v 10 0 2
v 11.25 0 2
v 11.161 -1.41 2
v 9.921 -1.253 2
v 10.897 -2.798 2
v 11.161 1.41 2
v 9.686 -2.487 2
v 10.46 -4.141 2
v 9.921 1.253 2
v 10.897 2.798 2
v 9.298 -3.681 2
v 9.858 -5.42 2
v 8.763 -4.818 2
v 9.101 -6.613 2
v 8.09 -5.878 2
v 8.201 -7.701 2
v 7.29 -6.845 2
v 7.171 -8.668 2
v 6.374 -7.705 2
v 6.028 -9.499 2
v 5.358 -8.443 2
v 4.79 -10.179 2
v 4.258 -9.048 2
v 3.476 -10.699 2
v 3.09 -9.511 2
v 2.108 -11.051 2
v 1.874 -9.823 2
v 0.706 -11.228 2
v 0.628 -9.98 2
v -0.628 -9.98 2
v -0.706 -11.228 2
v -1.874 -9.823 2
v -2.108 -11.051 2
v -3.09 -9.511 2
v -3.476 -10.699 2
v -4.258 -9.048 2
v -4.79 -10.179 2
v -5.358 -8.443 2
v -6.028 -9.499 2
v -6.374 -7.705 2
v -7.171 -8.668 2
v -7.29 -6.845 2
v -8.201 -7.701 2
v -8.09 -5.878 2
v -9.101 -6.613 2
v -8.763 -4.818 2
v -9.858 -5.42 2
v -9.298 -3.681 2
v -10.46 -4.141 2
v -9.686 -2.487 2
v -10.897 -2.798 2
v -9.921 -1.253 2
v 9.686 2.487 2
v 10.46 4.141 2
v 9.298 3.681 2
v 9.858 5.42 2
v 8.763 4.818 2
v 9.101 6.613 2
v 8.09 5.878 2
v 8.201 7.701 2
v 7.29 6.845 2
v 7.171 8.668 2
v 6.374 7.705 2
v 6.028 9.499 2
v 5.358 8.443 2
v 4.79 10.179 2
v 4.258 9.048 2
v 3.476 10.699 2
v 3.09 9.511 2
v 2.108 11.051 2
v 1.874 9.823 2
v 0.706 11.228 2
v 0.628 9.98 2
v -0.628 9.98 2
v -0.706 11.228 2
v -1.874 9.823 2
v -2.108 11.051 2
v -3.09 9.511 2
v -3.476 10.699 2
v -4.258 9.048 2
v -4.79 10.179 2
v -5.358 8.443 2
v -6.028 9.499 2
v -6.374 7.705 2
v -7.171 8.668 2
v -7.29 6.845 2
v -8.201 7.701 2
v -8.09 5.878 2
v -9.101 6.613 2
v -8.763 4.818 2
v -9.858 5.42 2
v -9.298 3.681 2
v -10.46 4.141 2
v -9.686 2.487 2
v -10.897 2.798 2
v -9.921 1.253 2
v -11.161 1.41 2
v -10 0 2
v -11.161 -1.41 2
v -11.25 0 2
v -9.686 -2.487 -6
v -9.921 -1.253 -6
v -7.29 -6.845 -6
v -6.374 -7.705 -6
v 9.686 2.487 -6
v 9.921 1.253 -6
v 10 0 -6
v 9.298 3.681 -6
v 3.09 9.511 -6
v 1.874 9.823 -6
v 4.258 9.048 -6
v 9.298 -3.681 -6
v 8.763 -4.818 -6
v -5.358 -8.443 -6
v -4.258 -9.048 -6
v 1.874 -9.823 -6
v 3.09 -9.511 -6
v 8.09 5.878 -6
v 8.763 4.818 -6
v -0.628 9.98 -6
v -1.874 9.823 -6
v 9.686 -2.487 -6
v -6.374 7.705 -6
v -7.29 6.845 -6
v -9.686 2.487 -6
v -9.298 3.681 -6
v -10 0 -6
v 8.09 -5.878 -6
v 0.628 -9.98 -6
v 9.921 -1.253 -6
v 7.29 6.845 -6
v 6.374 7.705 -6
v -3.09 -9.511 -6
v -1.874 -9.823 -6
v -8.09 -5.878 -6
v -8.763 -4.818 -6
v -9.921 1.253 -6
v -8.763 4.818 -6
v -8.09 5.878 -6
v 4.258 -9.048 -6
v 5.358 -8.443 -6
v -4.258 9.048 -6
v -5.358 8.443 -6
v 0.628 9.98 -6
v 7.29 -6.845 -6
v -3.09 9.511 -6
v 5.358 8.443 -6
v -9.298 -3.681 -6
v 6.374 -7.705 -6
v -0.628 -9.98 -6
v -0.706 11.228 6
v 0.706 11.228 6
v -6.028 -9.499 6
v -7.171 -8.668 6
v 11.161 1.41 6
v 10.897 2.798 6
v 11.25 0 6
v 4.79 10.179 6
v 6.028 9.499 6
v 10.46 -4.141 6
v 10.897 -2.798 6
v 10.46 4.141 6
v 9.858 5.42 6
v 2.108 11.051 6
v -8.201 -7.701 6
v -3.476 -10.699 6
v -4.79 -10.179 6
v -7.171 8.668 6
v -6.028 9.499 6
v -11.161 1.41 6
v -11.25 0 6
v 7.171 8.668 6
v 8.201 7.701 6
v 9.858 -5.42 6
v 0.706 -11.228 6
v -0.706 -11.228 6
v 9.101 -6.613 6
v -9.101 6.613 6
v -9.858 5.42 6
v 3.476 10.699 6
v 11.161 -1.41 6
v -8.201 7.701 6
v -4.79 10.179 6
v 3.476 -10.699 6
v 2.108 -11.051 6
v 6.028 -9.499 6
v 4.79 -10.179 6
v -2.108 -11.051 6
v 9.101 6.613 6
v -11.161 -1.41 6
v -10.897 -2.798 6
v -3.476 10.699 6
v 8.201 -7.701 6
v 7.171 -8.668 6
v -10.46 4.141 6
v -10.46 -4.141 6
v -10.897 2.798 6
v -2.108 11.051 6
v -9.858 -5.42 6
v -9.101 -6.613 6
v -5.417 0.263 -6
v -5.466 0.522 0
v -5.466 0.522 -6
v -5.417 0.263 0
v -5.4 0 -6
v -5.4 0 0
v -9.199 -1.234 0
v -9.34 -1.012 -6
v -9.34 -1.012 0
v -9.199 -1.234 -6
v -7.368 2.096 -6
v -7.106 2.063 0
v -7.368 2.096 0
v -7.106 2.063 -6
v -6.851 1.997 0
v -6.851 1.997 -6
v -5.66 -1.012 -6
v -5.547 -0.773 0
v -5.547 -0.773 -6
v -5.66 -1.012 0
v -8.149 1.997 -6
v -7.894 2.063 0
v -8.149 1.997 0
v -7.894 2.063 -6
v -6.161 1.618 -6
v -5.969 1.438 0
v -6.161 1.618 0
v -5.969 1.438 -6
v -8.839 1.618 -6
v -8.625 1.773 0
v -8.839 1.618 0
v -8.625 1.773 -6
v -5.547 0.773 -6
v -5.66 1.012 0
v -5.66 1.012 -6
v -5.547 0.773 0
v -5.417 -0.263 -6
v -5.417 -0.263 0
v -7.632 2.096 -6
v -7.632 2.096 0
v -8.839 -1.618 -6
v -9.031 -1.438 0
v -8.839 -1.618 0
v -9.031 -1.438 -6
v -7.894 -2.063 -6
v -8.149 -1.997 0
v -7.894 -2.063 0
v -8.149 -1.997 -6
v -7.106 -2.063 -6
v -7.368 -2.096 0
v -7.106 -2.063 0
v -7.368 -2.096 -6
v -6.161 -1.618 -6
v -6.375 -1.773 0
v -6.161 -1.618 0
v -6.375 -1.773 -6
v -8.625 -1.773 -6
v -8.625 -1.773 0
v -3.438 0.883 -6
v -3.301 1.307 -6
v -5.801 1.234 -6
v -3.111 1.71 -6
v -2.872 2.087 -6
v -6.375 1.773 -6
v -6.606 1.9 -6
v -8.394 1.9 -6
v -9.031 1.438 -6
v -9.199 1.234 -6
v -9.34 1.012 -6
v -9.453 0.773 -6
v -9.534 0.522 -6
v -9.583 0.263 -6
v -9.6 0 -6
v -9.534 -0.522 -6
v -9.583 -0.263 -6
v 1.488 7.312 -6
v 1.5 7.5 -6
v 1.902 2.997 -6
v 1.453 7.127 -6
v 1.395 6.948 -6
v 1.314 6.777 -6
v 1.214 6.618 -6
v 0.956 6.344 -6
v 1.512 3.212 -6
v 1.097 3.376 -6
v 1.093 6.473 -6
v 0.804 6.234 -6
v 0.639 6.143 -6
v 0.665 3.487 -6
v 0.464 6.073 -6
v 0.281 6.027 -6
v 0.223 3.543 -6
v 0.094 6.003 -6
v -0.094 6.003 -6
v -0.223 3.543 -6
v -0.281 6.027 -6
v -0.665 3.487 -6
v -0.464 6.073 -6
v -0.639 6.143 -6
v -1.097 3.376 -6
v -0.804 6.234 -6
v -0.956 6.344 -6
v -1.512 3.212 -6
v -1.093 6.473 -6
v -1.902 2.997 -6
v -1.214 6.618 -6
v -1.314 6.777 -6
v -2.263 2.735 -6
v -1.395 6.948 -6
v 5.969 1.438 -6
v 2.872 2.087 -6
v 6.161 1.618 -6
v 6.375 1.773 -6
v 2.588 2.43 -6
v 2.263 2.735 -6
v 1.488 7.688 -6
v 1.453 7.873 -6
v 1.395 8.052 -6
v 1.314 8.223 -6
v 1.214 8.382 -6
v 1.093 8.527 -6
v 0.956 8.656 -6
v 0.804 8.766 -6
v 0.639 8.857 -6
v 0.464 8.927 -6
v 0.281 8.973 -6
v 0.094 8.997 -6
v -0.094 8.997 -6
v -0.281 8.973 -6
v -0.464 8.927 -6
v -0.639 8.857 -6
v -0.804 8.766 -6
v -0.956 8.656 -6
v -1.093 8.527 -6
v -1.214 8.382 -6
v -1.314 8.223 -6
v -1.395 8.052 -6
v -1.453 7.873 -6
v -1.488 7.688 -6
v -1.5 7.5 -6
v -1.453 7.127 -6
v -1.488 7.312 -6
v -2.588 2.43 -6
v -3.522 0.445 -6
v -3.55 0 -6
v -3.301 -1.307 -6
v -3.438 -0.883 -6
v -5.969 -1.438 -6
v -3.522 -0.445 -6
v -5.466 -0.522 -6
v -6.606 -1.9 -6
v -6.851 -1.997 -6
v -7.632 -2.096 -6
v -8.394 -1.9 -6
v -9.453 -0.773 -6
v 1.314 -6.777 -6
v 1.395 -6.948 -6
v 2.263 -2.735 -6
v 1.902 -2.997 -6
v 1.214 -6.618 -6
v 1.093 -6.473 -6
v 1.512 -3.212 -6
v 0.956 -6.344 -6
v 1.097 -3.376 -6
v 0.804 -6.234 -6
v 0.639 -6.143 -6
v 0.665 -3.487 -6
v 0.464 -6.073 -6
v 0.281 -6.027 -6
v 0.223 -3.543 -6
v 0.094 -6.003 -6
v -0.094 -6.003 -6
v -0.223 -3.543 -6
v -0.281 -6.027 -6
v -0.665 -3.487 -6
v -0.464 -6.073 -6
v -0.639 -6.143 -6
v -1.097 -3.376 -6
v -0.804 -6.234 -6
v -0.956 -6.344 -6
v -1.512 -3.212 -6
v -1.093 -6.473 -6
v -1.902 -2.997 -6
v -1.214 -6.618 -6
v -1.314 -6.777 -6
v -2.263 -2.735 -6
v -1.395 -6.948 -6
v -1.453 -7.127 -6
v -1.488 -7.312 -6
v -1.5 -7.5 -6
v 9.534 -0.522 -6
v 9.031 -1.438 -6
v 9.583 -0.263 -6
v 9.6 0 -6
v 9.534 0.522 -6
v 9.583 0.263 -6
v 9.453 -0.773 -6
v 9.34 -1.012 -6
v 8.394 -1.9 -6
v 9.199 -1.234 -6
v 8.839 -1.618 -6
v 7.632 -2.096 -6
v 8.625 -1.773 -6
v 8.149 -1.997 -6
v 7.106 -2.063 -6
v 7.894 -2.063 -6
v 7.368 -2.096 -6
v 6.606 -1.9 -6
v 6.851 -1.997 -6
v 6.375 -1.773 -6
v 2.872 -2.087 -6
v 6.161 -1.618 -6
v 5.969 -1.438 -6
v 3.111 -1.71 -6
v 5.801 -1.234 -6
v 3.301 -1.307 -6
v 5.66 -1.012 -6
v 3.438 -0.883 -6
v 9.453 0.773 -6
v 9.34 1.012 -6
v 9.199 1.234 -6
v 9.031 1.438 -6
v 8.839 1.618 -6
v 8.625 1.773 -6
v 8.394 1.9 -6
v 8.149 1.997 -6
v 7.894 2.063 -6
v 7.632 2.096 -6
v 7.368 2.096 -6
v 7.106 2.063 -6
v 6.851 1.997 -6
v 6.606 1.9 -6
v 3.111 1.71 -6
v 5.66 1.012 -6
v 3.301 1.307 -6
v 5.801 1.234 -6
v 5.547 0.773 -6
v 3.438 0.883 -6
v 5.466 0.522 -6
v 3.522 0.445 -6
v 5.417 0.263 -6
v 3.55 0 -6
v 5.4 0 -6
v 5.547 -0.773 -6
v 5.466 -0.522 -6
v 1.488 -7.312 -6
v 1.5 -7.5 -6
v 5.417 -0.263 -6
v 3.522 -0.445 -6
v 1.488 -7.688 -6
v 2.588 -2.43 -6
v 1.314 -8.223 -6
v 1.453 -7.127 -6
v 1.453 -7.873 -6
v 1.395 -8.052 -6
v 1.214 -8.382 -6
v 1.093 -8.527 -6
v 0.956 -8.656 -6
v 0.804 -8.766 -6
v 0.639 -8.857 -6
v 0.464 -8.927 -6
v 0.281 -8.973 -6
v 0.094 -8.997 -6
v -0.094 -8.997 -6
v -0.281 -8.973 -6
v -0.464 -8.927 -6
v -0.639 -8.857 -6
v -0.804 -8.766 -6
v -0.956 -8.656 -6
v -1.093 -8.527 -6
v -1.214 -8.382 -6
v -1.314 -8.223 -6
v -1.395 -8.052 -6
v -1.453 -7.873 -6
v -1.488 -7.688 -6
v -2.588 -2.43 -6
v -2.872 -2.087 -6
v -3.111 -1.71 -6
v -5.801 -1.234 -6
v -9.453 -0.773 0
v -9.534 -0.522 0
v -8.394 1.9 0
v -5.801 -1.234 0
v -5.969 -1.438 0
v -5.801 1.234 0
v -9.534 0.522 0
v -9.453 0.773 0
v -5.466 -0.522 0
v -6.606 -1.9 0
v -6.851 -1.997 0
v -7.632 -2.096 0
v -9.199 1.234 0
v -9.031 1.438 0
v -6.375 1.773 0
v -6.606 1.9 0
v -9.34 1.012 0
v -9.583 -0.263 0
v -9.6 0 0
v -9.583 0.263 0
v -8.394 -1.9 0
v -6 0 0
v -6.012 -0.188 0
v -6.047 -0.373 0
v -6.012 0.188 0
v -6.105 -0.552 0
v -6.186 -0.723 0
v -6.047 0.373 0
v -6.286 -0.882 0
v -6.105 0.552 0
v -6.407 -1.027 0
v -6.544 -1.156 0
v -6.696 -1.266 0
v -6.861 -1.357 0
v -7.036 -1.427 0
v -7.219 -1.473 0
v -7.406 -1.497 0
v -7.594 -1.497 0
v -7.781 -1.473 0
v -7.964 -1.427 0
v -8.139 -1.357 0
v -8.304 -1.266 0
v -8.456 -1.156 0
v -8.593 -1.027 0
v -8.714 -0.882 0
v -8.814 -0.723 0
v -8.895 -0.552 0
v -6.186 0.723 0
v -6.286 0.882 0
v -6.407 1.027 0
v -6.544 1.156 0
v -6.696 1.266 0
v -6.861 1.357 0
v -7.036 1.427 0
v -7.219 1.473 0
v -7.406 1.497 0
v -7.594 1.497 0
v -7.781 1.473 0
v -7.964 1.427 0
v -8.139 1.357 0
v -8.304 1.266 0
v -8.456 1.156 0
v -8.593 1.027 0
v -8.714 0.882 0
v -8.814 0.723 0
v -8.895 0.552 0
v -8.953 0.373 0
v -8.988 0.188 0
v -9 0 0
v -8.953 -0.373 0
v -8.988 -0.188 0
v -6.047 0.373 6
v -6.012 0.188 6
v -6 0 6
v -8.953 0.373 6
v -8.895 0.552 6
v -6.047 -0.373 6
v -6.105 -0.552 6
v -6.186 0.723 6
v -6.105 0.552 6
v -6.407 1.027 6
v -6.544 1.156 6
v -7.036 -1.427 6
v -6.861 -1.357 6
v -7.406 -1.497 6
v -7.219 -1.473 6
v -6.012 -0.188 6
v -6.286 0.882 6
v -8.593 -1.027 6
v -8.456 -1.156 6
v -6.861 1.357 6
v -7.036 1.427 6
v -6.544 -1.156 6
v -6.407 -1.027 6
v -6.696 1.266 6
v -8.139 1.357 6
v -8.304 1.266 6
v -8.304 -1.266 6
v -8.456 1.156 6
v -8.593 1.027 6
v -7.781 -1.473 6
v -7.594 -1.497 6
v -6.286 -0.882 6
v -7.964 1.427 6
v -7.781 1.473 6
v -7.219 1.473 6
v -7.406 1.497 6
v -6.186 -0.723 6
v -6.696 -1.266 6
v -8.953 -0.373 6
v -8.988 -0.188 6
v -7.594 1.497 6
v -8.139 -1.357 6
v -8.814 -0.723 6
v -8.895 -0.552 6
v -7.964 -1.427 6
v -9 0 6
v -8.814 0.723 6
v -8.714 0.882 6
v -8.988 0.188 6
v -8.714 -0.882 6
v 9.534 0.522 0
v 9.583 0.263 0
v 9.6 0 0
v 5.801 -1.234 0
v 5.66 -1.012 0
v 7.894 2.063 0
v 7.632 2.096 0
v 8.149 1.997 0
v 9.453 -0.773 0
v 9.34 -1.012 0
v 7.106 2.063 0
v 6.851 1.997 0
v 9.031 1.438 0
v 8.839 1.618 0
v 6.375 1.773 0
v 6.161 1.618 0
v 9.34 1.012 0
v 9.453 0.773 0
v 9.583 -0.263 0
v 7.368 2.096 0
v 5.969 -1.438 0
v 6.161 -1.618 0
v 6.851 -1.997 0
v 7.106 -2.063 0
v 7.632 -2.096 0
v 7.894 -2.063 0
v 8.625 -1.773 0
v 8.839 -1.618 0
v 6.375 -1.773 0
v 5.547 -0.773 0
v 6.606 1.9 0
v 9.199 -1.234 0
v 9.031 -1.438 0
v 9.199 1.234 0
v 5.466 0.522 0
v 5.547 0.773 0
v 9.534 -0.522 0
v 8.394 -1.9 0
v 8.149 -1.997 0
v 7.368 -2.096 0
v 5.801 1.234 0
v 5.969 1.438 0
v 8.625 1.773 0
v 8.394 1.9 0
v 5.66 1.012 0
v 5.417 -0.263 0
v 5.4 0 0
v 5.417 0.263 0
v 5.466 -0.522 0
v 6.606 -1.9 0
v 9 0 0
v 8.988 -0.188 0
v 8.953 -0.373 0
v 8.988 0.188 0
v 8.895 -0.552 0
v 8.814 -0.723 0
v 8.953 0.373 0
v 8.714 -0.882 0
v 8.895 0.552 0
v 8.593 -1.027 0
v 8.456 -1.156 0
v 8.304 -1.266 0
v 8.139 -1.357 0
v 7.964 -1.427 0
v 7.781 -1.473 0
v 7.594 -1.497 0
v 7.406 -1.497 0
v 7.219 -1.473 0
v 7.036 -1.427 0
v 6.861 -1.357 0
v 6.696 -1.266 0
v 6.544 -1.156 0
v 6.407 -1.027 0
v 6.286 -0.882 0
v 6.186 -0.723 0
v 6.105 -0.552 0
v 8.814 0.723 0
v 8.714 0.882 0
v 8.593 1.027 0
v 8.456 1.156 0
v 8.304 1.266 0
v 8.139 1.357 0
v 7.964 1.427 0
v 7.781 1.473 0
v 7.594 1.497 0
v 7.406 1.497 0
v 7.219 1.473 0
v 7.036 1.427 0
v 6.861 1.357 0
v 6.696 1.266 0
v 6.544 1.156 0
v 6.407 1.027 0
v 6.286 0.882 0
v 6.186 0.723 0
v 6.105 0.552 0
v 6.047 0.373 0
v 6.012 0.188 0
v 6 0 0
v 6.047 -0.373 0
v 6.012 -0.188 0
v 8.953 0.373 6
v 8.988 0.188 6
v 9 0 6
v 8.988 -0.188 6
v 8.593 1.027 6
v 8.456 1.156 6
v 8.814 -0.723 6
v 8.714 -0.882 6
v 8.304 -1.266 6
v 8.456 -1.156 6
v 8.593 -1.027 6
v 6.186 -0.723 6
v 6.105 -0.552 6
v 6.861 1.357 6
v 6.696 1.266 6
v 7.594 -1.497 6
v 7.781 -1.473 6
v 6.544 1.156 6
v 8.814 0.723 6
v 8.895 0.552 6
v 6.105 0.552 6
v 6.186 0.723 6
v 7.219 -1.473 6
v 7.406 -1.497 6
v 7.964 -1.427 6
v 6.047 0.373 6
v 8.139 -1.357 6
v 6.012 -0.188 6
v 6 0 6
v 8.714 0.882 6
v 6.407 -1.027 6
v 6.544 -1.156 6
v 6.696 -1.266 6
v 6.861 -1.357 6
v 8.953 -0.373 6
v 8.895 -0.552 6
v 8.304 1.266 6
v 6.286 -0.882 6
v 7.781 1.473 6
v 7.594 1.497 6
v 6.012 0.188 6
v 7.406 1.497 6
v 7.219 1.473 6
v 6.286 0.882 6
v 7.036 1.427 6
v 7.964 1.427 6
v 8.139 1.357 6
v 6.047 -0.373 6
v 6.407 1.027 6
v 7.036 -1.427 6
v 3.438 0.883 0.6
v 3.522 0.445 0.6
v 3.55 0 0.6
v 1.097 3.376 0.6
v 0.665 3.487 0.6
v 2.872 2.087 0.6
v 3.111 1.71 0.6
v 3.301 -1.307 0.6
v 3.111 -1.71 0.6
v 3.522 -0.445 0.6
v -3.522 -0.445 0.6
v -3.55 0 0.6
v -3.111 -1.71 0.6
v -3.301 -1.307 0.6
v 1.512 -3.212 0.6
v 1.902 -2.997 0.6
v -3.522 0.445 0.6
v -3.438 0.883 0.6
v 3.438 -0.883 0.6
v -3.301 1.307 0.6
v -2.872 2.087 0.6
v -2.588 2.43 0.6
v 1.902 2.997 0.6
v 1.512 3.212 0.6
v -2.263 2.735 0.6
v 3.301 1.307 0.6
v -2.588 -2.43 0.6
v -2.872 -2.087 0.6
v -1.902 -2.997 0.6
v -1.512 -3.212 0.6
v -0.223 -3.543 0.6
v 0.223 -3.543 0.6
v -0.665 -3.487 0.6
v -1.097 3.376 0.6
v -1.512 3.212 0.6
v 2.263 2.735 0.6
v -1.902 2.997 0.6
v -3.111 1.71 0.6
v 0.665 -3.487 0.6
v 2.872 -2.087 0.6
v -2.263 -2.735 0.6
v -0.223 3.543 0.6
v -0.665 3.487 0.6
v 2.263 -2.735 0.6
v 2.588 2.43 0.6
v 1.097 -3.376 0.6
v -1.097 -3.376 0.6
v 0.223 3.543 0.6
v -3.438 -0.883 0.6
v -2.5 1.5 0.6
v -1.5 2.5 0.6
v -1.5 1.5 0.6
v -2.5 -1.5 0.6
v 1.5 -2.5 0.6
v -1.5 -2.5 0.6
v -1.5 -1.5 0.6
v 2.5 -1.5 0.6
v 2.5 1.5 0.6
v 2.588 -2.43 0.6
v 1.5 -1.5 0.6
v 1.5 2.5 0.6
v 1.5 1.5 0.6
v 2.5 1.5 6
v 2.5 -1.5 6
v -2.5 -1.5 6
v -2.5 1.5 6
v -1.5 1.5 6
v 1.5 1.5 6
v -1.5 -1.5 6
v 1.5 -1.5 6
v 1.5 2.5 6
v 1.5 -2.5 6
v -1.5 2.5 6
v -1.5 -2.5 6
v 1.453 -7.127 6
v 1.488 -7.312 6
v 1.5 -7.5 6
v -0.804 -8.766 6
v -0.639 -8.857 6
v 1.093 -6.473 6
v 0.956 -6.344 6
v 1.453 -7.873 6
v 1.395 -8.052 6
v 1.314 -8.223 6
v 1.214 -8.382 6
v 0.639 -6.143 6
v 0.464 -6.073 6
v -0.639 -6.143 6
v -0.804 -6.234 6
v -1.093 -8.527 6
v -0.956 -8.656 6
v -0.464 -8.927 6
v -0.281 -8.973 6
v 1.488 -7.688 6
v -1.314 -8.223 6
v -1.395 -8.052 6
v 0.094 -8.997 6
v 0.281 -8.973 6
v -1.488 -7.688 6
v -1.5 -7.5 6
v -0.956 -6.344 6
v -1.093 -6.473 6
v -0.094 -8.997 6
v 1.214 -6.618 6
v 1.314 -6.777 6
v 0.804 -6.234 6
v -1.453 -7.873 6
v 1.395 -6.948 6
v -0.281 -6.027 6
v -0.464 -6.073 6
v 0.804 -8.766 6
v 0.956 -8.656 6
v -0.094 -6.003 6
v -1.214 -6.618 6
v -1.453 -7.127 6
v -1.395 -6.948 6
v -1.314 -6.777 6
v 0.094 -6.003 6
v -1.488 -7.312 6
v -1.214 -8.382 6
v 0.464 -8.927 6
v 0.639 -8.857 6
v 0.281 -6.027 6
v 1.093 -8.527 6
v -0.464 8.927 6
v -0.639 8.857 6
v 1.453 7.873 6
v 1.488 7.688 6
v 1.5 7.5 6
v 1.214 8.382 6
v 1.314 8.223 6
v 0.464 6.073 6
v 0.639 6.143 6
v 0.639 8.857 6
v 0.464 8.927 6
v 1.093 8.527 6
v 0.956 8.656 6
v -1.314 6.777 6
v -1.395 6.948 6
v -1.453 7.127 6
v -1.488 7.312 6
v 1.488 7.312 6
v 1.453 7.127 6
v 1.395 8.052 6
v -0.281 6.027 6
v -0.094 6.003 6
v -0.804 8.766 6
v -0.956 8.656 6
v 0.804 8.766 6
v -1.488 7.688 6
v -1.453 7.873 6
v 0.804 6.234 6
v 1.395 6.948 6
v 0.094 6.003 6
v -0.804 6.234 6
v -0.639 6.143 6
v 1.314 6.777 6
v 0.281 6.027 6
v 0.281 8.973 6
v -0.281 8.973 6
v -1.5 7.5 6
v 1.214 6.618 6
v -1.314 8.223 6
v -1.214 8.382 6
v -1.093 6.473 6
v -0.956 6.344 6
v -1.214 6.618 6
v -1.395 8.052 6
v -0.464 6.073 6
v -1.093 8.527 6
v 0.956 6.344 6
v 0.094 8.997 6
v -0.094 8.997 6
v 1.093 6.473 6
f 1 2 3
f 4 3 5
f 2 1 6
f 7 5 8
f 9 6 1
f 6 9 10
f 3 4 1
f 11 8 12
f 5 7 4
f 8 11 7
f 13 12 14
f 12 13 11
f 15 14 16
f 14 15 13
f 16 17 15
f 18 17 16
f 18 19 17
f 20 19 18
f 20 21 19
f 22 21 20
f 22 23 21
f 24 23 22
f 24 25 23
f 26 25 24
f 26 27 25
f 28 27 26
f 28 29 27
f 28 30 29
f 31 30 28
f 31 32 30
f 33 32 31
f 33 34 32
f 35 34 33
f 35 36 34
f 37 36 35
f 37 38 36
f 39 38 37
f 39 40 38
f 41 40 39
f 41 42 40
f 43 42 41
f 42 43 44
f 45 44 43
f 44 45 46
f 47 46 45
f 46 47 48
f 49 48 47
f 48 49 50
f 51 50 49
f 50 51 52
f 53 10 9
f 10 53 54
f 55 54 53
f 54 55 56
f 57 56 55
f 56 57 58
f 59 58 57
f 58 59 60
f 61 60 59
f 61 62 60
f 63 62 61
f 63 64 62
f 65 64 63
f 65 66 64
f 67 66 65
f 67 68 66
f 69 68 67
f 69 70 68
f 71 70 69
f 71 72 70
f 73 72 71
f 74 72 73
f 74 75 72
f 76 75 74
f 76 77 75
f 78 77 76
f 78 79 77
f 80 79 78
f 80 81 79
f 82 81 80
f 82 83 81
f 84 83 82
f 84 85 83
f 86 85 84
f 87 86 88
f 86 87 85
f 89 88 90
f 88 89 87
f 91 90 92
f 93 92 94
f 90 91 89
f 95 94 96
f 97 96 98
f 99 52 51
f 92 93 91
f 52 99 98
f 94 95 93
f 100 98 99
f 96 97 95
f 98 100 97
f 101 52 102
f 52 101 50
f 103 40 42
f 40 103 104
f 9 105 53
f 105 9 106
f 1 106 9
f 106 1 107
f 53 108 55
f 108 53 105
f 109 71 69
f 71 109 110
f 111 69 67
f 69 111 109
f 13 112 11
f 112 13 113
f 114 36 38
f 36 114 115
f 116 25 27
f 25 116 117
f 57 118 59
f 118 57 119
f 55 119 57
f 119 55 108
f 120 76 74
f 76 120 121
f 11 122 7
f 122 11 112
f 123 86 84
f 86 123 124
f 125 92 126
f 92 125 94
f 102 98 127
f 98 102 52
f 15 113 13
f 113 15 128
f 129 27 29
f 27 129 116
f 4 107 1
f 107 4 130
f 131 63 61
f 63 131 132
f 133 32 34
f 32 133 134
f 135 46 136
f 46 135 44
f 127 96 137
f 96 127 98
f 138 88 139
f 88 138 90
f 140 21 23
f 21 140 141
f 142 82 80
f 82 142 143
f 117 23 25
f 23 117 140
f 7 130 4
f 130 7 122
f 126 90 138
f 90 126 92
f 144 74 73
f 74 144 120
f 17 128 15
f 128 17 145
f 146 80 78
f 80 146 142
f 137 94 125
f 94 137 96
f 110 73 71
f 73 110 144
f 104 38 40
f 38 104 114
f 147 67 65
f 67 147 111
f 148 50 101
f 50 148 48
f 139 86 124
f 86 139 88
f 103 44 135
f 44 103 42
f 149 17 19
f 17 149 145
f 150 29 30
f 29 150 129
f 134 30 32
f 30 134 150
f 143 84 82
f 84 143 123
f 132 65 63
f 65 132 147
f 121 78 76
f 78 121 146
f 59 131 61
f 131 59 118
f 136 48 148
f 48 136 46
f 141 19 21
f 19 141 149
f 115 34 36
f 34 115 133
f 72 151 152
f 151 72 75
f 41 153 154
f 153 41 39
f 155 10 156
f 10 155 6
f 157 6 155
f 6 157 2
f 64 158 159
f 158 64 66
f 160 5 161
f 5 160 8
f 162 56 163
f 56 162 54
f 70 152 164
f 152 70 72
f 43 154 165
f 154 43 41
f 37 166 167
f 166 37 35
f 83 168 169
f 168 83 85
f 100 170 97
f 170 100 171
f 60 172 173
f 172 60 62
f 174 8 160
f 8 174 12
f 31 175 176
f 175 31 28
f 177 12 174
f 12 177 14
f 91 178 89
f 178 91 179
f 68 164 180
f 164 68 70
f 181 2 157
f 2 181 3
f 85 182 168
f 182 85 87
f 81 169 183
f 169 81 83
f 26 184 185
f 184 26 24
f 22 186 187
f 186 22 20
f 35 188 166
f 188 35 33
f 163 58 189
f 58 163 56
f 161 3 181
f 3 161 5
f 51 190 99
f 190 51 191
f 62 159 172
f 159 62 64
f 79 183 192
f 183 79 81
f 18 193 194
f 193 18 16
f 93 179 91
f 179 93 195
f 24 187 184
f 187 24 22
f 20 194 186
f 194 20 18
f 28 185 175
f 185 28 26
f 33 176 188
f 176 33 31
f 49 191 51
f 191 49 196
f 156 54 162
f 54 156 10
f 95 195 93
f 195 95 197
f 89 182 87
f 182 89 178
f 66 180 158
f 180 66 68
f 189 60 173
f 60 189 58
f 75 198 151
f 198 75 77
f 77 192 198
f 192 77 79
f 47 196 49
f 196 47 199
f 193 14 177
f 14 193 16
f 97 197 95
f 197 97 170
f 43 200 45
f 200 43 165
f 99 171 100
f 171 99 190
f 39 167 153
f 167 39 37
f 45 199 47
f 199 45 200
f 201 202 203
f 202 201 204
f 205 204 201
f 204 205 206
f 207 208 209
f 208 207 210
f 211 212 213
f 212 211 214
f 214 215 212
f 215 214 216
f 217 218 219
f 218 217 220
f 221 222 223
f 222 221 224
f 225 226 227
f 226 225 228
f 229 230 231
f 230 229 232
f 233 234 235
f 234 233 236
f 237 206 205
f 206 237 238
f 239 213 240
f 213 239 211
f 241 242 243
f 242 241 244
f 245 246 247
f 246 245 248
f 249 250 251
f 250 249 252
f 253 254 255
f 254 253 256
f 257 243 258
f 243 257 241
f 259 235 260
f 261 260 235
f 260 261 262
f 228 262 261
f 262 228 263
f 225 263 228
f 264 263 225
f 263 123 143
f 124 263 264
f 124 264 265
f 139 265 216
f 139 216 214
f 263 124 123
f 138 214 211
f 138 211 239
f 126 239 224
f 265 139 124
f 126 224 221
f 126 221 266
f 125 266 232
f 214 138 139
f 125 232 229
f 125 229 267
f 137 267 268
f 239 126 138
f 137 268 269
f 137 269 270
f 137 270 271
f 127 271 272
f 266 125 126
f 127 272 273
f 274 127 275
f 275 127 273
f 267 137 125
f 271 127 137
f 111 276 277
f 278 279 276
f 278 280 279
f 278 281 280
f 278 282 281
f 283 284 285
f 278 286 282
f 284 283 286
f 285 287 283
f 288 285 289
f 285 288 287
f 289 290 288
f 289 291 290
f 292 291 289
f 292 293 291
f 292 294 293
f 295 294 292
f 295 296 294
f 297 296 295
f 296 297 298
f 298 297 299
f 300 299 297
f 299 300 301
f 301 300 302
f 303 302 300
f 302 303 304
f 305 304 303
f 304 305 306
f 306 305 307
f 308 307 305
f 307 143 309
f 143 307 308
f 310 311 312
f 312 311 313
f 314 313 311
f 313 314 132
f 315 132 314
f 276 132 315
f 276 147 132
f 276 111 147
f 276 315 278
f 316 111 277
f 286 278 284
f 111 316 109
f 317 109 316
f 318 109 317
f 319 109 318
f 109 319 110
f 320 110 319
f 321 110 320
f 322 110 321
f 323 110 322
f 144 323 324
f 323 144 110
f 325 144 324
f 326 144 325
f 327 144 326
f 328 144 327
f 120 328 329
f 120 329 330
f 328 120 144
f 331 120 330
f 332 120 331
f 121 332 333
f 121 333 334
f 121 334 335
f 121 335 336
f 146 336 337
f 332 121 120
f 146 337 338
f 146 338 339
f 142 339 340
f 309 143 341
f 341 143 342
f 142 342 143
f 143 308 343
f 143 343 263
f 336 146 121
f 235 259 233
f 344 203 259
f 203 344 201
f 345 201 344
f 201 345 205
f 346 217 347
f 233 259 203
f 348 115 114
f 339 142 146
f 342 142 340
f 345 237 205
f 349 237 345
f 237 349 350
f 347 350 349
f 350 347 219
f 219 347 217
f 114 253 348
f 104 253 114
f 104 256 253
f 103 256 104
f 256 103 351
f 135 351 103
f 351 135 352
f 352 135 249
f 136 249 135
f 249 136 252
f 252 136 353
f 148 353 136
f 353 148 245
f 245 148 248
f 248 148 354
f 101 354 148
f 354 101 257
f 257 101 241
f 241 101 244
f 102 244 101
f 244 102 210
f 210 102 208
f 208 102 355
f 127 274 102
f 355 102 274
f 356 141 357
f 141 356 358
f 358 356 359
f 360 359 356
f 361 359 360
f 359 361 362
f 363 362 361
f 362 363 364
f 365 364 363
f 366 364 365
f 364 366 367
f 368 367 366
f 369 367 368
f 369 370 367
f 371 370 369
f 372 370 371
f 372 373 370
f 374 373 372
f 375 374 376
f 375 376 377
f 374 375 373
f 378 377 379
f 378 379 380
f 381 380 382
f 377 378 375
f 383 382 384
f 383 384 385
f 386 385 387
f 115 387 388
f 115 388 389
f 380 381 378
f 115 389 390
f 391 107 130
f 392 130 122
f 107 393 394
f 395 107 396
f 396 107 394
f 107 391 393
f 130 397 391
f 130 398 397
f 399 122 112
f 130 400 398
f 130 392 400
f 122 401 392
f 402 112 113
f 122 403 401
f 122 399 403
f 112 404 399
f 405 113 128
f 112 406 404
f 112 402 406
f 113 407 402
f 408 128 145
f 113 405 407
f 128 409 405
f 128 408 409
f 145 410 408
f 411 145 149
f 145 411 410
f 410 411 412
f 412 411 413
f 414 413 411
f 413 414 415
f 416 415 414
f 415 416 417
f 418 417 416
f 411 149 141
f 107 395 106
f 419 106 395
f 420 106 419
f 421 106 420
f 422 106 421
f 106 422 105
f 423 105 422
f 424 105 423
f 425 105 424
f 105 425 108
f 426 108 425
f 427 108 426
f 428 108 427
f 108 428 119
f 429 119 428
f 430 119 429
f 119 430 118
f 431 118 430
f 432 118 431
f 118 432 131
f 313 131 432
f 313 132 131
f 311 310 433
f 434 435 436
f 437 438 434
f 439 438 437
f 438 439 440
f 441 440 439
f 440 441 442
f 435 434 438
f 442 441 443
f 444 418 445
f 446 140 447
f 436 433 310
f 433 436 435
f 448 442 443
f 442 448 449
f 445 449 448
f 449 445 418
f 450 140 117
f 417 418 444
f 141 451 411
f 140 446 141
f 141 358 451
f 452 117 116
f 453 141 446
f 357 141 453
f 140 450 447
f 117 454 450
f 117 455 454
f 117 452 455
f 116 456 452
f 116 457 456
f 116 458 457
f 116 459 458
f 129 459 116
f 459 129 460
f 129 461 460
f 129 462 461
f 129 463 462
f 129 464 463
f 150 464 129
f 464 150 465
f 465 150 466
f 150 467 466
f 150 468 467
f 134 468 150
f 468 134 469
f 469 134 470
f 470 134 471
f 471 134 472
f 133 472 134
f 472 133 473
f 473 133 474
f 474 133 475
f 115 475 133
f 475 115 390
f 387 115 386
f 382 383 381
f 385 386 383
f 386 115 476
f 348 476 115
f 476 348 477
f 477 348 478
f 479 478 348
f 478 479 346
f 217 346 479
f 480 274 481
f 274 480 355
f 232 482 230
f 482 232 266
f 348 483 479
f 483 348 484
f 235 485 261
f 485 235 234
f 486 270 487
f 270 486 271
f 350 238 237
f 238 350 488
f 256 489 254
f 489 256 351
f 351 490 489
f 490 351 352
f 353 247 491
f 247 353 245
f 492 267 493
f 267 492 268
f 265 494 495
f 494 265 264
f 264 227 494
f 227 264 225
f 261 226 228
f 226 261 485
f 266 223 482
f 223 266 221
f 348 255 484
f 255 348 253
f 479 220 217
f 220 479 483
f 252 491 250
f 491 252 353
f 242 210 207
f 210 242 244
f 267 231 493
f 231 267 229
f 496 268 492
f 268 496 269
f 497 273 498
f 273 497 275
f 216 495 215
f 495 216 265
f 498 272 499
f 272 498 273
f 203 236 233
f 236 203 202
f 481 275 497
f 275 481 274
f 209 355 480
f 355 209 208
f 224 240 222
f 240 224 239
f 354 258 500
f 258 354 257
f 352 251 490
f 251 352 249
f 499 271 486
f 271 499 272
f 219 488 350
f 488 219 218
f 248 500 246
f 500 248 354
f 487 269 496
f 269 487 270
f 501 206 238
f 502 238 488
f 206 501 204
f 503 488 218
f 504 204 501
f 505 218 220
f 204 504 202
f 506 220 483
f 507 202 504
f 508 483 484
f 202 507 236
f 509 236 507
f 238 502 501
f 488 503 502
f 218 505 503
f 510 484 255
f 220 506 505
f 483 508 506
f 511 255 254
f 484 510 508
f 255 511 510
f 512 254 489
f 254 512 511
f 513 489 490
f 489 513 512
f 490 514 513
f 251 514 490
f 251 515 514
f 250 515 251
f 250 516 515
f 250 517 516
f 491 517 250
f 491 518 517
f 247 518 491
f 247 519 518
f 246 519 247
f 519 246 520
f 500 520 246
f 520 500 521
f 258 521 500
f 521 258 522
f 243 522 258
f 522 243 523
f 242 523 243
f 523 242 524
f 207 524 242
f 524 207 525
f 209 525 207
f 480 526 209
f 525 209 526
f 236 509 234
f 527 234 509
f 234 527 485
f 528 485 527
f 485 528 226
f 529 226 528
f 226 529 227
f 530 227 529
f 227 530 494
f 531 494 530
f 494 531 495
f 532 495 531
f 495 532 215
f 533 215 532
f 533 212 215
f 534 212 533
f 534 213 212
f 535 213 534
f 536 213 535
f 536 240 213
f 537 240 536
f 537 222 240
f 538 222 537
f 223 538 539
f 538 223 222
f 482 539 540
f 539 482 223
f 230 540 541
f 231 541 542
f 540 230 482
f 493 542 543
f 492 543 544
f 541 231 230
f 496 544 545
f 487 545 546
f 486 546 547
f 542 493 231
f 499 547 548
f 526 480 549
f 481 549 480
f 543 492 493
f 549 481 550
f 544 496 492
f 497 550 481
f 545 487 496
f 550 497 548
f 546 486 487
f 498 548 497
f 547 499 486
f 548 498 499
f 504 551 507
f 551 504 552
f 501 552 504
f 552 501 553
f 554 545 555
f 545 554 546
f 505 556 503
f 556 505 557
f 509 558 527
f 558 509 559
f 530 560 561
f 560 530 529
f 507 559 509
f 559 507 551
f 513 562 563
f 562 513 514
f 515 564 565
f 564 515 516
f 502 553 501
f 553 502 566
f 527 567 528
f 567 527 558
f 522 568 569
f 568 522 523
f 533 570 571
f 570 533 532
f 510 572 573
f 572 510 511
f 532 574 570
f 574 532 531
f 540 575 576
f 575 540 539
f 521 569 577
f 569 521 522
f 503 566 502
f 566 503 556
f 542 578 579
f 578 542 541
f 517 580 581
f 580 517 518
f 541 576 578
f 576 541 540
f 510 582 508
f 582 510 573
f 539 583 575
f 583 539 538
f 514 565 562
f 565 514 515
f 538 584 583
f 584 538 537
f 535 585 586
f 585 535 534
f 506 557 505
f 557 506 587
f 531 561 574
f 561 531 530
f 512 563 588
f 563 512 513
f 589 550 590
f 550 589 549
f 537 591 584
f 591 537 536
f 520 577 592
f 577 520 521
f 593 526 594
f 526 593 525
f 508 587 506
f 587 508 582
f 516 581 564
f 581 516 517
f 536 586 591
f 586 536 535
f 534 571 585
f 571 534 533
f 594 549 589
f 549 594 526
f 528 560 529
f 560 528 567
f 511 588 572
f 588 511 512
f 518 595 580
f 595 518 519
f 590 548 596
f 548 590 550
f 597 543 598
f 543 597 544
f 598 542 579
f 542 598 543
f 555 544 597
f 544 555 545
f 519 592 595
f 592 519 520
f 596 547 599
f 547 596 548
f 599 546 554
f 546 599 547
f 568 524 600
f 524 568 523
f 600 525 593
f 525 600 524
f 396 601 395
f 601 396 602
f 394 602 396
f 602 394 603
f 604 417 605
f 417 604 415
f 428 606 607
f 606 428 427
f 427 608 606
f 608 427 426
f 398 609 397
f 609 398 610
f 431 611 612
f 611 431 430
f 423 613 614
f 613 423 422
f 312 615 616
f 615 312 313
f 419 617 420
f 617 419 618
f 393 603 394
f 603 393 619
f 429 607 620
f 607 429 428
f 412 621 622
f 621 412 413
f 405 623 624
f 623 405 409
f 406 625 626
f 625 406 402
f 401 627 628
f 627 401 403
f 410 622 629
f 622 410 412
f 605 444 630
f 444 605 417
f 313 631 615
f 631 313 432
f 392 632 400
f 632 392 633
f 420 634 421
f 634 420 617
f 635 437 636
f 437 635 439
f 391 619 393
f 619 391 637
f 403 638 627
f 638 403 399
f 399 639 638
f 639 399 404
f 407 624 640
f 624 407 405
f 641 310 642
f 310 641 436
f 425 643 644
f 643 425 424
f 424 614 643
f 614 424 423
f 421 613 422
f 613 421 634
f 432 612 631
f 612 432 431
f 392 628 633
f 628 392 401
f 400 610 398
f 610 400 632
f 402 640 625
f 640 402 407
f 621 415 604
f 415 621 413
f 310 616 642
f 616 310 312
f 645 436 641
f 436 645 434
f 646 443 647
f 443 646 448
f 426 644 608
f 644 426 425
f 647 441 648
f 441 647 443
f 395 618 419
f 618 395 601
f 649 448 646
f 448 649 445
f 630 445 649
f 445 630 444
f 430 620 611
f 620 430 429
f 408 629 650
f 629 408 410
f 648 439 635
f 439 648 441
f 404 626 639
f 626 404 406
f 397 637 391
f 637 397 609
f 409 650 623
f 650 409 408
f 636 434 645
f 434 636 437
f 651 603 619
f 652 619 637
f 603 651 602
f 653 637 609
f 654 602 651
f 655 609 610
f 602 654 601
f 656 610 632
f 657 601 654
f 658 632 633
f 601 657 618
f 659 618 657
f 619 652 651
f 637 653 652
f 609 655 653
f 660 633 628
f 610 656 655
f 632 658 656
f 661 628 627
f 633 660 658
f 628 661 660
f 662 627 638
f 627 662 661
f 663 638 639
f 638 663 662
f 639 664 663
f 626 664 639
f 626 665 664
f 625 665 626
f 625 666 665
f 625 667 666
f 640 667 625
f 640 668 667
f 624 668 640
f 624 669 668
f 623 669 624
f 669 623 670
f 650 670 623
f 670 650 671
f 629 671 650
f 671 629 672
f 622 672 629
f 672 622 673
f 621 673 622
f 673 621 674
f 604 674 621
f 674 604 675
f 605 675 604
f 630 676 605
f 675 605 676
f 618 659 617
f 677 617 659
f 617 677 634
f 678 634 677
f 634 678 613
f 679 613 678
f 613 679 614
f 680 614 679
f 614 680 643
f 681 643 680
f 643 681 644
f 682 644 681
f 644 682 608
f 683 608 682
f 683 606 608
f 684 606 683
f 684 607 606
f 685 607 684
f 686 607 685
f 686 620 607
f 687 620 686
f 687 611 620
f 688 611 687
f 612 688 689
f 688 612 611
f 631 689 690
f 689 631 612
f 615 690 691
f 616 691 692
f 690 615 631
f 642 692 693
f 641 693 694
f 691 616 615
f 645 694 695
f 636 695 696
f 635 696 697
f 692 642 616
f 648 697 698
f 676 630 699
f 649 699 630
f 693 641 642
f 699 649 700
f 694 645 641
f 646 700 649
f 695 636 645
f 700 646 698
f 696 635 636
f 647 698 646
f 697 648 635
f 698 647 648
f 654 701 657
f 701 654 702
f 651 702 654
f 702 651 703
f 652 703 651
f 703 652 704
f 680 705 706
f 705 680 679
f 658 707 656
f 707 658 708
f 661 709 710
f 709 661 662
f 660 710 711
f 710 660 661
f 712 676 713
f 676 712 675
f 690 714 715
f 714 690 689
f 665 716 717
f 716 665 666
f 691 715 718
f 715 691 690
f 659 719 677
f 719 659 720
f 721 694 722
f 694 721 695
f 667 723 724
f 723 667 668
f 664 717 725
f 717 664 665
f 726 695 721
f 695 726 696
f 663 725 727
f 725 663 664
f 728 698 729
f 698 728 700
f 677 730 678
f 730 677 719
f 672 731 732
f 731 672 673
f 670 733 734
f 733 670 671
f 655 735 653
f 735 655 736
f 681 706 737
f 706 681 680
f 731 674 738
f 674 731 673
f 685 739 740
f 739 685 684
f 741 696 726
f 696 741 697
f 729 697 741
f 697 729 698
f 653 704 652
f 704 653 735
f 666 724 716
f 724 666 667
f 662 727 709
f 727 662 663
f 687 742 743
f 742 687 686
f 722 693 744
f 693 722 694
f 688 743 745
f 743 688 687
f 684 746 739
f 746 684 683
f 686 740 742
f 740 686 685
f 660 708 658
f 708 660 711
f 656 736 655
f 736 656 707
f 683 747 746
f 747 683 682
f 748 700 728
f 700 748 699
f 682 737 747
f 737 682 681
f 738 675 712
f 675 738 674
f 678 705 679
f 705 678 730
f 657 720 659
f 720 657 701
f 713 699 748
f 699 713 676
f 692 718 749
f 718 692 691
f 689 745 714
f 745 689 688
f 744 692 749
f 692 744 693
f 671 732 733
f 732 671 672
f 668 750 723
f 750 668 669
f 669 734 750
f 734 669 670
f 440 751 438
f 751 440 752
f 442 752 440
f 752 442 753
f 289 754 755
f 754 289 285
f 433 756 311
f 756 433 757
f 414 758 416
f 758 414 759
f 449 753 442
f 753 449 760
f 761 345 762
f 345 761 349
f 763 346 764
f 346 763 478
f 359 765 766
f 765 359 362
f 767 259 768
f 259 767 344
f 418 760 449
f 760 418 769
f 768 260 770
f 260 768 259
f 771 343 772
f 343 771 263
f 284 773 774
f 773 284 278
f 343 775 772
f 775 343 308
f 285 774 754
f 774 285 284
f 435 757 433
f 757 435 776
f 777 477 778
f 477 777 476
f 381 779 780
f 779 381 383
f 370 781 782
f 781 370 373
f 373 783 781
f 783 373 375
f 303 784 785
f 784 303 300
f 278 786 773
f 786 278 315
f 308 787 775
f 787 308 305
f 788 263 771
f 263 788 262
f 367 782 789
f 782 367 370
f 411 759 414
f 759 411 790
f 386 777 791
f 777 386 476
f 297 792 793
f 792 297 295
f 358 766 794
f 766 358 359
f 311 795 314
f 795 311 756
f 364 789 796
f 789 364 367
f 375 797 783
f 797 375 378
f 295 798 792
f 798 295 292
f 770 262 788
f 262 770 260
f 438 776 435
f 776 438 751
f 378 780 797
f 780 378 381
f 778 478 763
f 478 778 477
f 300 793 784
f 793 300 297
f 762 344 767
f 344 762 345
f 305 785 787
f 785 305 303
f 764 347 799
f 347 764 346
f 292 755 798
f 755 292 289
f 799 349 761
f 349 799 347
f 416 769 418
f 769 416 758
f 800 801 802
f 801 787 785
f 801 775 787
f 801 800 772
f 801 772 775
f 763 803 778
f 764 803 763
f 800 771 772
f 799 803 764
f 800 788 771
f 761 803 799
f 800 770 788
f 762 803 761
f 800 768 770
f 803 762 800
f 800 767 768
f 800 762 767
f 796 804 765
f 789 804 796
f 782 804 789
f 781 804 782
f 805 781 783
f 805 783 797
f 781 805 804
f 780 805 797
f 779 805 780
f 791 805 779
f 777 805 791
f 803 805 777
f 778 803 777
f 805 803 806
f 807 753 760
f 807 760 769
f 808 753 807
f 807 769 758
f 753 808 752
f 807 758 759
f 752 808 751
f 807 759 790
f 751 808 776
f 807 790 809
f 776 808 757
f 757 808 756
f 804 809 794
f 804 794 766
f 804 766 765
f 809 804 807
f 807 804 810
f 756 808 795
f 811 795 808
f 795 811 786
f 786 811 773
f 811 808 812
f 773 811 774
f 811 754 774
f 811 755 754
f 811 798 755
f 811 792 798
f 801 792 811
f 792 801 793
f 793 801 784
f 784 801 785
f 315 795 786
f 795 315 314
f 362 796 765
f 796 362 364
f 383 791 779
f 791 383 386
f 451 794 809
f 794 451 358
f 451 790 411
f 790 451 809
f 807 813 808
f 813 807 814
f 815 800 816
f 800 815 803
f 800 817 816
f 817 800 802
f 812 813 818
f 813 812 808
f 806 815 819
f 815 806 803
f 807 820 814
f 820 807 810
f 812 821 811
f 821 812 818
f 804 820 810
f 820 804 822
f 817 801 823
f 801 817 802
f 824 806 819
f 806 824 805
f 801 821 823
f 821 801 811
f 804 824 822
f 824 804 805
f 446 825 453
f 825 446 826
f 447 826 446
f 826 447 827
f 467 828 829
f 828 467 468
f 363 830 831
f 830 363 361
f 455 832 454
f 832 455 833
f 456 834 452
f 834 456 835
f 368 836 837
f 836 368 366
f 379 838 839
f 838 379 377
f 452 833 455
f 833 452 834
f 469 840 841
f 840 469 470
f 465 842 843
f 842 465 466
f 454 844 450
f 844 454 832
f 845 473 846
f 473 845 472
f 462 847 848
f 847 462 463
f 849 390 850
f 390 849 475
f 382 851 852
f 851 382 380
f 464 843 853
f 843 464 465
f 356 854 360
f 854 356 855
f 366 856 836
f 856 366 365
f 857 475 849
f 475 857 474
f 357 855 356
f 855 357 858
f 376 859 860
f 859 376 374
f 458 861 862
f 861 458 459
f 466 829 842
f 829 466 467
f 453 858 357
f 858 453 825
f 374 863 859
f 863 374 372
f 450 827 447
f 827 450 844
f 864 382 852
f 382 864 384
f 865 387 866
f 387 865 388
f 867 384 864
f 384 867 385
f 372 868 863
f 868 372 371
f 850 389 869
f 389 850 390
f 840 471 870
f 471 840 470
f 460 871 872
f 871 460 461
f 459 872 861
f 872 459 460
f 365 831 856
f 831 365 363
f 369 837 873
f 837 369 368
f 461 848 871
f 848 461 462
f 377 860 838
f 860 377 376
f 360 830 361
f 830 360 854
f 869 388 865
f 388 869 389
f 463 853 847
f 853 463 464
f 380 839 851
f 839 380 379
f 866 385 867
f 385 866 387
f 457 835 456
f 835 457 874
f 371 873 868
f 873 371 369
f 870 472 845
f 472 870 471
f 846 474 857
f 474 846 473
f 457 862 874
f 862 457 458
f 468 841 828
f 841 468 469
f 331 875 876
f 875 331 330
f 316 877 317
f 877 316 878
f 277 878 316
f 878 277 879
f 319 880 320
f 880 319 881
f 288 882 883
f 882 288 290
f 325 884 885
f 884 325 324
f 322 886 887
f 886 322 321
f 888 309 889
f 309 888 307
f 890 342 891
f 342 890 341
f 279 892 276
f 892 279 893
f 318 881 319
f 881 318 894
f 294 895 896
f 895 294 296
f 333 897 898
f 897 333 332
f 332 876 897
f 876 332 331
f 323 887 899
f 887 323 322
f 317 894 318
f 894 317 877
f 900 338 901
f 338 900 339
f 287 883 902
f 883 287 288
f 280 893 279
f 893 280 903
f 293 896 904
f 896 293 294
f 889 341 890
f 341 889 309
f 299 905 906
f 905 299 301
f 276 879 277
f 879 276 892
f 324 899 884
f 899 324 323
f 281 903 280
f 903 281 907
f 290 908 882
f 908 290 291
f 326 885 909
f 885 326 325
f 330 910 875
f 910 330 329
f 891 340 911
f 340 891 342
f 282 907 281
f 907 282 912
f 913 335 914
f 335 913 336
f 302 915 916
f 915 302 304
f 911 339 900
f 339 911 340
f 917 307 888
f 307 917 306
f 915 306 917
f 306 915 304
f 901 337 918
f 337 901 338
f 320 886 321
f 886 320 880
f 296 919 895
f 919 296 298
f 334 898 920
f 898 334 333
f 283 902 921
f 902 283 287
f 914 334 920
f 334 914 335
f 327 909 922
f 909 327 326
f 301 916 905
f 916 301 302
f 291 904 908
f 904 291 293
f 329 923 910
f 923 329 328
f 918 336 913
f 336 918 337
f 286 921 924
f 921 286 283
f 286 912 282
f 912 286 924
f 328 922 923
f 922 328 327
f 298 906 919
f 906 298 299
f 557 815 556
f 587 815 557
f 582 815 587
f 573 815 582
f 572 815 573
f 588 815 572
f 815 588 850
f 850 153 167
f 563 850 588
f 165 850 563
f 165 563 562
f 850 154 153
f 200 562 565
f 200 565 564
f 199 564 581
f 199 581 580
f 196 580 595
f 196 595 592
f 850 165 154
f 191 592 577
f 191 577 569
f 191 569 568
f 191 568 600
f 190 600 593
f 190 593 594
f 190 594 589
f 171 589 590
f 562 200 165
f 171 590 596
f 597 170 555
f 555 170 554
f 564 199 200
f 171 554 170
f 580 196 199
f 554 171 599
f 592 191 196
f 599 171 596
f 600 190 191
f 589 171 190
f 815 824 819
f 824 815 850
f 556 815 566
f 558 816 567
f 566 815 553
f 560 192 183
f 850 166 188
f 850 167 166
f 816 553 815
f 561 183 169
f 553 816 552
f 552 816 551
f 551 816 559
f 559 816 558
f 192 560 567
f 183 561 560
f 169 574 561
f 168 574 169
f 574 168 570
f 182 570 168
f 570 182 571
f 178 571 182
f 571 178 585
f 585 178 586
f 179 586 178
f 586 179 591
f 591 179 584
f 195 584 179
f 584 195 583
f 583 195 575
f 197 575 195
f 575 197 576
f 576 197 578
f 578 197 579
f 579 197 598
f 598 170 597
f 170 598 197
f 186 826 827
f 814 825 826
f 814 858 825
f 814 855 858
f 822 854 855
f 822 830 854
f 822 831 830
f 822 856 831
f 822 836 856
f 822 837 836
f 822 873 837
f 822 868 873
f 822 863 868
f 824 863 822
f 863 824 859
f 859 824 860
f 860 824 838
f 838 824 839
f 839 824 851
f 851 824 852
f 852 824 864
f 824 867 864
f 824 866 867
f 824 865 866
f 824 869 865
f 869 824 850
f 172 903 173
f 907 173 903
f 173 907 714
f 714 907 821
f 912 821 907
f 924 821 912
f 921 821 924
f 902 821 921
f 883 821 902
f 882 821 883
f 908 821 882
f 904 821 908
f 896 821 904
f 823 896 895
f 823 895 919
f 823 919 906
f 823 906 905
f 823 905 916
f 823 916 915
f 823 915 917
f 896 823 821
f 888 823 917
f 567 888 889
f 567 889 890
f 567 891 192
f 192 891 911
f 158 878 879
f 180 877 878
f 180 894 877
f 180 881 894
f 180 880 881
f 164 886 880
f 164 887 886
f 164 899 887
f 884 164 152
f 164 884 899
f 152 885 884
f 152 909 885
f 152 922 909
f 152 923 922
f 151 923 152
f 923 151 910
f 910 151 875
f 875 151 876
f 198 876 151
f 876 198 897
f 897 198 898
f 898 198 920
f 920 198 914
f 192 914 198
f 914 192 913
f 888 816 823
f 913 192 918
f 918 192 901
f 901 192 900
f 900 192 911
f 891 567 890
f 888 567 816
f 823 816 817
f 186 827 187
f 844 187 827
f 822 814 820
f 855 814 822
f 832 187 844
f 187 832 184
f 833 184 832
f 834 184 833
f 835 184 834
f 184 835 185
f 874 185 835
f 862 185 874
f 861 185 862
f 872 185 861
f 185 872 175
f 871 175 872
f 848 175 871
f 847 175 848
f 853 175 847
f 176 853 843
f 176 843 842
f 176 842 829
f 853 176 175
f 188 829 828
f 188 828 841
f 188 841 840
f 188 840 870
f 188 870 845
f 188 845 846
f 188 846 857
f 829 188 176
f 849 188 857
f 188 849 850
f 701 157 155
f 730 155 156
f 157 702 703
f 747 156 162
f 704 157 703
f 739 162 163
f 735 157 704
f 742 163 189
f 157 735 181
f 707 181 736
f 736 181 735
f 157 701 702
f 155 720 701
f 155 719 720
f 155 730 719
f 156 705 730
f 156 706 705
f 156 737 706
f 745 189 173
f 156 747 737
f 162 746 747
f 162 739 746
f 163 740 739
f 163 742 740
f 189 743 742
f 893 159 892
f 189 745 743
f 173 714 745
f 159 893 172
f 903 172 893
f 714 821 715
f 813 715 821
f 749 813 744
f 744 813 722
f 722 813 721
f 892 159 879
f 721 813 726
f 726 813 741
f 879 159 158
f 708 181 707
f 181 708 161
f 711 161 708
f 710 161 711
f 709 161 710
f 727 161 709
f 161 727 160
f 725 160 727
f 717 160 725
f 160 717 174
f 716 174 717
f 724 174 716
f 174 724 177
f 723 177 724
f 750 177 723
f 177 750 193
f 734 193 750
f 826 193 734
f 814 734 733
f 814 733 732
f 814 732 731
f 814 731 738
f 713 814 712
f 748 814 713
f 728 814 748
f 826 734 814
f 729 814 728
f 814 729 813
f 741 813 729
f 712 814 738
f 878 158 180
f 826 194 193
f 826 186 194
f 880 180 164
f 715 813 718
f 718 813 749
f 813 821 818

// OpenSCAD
$fn = 50;

difference() {
	union() {
		translate(v = [0, 0, 0]) {
			rotate(a = [0, 0, 0]) {
				difference() {
					union() {
						translate(v = [0, 0, -6.0]) {
							cylinder(h = 12, r = 12);
						}
					}
					union() {
						translate(v = [0, 0, 0]) {
							rotate(a = [0, 0, 0]) {
								difference() {
									union() {
										translate(v = [0, 0, -2.0]) {
											cylinder(h = 4, r = 13.5);
										}
									}
									union() {
										translate(v = [0, 0, -2.01]) {
											cylinder(h = 4.02, r = 10.0);
										}
									}
								}
							}
						}
						translate(v = [0, 0, -3]) {
							rotate(a = [0, 0, 0]) {
								difference() {
									union() {
										translate(v = [0, 0, -2.0]) {
											cylinder(h = 4, r = 13.5);
										}
									}
									union() {
										translate(v = [0, 0, -2.01]) {
											cylinder(h = 4.02, r = 10.0);
										}
									}
								}
							}
						}
						translate(v = [0, 0, -6]) {
							rotate(a = [0, 0, 0]) {
								difference() {
									union() {
										translate(v = [0, 0, -2.0]) {
											cylinder(h = 4, r = 13.5);
										}
									}
									union() {
										translate(v = [0, 0, -2.01]) {
											cylinder(h = 4.02, r = 10.0);
										}
									}
								}
							}
						}
						translate(v = [0, 0, 0]) {
							rotate(a = [0, 0, 0]) {
								difference() {
									union() {
										translate(v = [0, 0, -21.0]) {
											cylinder(h = 42, r = 12.25);
										}
									}
									union() {
										translate(v = [0, 0, -21.01]) {
											cylinder(h = 42.02, r = 11.25);
										}
									}
								}
							}
						}
						translate(v = [-7.5, 0, -6.0]) {
							cylinder(h = 6, r = 2.1);
						}
						translate(v = [-7.5, 0, -7.0]) {
							cylinder(h = 14, r = 1.5);
						}
						translate(v = [7.5, 0, -6.0]) {
							cylinder(h = 6, r = 2.1);
						}
						translate(v = [7.5, 0, -7.0]) {
							cylinder(h = 14, r = 1.5);
						}
						translate(v = [0, 0, -6.000000000000001]) {
							cylinder(h = 6.6, r = 3.55);
						}
						translate(v = [-2.5, -1.5, -7.0]) {
							cube(size = [5, 3, 14]);
						}
						translate(v = [-1.5, -2.5, -7.0]) {
							cube(size = [3, 5, 14]);
						}
						translate(v = [0.0, -7.5, -7.0]) {
							cylinder(h = 14, r = 1.5);
						}
						translate(v = [0.0, 7.5, -7.0]) {
							cylinder(h = 14, r = 1.5);
						}
					}
				}
			}
		}
	}
	union();
}
